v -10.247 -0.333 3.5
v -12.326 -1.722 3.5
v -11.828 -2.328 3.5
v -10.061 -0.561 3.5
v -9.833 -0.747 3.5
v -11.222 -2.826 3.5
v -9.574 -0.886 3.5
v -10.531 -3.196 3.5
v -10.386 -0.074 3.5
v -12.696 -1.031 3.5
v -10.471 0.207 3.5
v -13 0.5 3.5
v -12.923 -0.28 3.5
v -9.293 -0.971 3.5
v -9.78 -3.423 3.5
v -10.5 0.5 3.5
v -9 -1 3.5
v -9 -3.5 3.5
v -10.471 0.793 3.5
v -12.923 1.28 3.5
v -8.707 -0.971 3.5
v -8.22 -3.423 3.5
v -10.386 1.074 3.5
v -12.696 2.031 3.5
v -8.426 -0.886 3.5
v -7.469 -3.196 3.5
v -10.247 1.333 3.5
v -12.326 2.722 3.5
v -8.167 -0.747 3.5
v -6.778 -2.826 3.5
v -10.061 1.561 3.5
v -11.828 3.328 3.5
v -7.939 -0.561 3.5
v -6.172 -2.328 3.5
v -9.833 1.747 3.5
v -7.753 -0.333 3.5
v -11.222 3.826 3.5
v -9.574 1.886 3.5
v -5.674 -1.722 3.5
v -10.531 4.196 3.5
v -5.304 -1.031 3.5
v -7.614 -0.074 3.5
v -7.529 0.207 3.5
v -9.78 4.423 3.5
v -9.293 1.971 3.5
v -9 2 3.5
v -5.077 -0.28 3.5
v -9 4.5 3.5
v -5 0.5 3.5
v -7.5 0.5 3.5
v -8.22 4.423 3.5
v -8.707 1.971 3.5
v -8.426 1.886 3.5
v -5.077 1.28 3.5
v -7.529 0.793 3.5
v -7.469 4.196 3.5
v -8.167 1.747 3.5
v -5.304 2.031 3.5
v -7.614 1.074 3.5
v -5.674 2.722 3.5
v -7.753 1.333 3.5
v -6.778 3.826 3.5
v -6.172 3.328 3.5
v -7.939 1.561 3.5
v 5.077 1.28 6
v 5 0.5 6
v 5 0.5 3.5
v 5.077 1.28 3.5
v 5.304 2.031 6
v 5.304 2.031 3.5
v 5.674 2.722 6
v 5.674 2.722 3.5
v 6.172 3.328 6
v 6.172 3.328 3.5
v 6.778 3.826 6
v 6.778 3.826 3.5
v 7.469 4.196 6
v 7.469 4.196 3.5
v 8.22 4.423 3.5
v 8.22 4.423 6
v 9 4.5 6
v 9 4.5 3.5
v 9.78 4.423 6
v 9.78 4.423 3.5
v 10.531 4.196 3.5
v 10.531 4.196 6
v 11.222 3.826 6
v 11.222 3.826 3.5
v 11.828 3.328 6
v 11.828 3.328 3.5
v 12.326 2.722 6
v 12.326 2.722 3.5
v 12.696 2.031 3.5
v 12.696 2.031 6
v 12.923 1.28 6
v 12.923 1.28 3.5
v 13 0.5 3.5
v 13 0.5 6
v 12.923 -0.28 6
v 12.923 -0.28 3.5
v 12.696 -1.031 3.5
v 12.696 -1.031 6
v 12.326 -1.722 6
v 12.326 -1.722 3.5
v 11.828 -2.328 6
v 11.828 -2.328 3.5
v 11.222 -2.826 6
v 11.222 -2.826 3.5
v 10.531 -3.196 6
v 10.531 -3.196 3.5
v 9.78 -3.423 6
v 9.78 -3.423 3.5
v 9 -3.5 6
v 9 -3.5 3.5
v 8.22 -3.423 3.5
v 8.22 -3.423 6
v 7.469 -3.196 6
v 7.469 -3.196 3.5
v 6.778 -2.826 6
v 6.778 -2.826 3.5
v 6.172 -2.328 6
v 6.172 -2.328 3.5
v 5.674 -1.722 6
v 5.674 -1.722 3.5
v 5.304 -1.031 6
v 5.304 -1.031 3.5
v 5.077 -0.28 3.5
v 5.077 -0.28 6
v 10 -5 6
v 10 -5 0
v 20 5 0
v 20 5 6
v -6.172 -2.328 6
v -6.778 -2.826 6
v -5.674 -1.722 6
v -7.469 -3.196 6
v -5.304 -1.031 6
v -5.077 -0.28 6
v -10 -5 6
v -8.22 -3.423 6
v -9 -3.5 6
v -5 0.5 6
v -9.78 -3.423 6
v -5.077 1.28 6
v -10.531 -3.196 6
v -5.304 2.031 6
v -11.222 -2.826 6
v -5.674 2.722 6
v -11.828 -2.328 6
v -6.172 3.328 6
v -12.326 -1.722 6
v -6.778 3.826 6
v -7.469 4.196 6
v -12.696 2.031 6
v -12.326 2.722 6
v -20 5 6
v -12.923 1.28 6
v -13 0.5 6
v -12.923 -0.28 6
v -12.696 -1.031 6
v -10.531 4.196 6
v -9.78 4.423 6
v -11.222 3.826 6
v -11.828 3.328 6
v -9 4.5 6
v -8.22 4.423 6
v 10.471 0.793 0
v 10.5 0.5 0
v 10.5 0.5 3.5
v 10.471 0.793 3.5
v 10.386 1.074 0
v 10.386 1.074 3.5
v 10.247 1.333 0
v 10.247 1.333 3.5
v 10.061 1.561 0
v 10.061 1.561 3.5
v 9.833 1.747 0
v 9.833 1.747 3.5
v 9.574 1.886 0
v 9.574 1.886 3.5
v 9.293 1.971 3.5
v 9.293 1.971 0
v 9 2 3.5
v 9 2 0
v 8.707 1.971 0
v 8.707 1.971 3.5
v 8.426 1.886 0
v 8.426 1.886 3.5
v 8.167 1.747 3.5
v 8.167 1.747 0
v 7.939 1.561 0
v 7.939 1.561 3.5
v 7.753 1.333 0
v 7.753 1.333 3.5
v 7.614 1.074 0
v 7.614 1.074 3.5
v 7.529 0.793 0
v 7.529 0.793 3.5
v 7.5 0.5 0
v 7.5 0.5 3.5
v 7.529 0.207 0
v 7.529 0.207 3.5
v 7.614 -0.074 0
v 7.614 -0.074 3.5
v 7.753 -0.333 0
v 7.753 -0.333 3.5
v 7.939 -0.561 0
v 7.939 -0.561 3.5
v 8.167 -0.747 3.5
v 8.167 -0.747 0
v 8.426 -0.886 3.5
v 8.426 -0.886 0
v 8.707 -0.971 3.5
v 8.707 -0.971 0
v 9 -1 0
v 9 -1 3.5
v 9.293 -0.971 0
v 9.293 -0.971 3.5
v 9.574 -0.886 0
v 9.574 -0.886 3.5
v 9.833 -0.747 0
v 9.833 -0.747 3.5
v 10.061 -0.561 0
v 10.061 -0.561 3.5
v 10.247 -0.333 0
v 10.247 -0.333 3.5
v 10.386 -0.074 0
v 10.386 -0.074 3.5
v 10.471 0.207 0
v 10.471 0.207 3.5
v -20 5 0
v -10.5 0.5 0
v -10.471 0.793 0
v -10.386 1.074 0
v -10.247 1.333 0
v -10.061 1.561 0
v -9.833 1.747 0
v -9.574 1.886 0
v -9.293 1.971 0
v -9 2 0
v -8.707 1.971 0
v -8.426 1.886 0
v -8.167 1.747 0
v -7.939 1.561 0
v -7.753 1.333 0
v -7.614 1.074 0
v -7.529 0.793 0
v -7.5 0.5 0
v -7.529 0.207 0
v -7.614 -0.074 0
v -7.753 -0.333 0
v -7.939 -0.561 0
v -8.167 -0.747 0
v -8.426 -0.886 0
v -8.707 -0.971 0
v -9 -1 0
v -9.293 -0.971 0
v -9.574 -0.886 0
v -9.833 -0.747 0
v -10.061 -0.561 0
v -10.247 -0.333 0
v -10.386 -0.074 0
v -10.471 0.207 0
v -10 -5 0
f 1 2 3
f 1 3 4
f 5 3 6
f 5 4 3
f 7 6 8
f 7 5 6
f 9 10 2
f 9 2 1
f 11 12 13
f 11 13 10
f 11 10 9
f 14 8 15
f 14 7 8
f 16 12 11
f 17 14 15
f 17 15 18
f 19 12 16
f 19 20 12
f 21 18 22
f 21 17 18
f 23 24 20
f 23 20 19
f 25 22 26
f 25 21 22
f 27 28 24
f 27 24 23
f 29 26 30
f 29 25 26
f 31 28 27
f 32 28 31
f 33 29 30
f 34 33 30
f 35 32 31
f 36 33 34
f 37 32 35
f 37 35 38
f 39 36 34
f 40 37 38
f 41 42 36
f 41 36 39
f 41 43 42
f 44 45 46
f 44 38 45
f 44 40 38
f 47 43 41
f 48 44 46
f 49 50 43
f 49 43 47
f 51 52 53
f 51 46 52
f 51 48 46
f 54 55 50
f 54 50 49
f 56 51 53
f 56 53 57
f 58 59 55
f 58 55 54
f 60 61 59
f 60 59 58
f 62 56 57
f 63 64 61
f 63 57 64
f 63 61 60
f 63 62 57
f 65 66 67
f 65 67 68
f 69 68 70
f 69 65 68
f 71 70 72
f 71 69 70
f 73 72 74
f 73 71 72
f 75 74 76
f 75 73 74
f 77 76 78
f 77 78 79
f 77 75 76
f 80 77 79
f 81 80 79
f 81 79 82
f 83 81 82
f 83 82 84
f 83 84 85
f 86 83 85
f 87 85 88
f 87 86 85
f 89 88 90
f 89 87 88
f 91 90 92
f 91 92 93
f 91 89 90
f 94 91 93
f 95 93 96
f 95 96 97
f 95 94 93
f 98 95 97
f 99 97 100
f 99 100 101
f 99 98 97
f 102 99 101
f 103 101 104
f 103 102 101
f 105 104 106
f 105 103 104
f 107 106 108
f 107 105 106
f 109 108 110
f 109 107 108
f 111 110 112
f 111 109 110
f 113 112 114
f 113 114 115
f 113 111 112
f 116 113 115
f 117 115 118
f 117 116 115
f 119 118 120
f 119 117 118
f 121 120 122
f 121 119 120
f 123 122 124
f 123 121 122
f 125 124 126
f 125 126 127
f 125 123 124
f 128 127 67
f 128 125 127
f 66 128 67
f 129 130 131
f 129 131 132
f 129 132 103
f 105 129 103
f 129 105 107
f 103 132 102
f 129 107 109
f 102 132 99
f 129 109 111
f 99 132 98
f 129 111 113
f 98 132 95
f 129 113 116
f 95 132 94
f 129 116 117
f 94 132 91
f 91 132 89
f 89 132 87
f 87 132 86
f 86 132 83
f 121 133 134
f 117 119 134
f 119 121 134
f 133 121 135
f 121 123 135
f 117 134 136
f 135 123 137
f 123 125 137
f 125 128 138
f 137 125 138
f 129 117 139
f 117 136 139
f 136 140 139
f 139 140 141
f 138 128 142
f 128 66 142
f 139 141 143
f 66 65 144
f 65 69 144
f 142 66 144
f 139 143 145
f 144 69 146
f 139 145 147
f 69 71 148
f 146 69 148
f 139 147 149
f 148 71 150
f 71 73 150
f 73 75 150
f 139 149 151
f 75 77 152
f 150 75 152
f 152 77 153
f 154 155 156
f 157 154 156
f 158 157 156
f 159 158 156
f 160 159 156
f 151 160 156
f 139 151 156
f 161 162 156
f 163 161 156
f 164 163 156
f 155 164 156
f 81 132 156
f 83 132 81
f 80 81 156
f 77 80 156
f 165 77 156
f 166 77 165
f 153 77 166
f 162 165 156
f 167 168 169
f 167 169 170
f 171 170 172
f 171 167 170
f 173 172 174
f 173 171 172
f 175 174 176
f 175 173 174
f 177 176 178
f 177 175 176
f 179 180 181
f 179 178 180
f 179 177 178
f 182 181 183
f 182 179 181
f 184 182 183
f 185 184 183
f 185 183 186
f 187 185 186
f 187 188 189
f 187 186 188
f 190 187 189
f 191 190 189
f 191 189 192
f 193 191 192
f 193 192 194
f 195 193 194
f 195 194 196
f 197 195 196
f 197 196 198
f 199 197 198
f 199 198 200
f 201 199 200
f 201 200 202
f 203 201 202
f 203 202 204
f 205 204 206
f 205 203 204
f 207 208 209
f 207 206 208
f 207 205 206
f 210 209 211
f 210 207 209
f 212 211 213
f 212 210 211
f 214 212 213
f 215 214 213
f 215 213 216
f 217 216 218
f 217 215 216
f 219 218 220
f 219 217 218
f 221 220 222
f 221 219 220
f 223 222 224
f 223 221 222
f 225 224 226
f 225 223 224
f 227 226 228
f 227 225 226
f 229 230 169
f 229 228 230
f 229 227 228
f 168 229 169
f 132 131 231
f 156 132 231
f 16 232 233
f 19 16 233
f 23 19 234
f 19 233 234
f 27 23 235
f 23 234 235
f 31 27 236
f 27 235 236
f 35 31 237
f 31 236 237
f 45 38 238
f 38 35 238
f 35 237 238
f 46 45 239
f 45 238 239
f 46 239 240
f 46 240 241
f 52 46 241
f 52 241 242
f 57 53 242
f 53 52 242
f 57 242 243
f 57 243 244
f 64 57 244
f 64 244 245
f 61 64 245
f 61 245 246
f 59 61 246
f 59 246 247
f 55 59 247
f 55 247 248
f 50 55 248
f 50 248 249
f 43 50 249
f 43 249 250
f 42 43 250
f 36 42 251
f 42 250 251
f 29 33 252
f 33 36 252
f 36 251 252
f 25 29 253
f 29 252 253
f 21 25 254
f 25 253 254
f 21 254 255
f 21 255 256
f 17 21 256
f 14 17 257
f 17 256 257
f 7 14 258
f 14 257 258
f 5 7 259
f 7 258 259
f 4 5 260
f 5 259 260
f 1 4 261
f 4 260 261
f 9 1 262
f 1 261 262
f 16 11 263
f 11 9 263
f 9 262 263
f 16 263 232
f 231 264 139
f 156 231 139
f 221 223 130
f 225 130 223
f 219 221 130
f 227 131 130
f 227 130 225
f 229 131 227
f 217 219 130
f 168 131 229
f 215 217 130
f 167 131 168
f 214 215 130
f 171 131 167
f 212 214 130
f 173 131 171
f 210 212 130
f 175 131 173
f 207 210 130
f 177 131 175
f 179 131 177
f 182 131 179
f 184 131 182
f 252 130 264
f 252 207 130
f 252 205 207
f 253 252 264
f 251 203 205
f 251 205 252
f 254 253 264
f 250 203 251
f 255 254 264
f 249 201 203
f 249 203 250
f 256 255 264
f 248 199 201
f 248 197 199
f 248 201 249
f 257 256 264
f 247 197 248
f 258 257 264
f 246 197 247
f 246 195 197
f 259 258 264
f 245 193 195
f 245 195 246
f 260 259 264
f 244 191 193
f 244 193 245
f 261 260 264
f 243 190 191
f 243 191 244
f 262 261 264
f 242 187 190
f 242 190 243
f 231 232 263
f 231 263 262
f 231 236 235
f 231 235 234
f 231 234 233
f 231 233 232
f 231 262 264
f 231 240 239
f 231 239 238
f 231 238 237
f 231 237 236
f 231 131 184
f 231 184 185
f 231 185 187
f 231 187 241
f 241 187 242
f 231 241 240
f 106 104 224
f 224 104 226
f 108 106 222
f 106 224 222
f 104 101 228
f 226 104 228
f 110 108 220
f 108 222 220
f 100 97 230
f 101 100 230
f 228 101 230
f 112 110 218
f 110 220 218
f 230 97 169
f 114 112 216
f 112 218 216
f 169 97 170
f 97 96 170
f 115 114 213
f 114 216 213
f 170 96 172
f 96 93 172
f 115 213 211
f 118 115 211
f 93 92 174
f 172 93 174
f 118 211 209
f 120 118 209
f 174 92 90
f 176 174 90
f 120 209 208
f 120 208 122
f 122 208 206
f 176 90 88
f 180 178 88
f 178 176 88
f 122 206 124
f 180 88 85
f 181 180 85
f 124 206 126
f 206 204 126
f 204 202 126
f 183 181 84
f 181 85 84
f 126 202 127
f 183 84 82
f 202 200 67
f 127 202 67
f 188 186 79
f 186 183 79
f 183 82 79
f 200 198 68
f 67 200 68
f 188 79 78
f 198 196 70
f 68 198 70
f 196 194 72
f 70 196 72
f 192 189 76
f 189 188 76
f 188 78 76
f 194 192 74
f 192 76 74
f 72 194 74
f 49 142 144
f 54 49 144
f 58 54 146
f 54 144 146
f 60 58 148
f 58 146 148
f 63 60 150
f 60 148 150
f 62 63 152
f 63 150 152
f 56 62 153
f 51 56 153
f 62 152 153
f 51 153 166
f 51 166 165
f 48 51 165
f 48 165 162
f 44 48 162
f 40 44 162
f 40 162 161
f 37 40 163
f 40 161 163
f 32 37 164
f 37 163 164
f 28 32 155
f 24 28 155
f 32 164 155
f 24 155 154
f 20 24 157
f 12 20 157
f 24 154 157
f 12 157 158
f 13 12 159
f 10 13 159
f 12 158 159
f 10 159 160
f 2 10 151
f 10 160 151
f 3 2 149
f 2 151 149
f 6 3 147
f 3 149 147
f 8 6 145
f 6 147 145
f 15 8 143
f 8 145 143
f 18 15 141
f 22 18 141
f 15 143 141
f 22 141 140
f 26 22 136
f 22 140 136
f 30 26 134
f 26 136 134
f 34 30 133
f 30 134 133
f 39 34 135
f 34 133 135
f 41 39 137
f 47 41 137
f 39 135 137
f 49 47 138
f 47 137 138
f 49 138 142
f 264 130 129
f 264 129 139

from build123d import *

# Parameters (mm, degrees)
F0_W           = 20
F0_H           = 10
F1_DEPTH       = 6
F2_SIZE        = 9.99999
F3_R           = 4
F4_DEPTH       = 2.5
F6_D           = 3
F6_DEPTH       = 10
F6_CBORE_D     = 3
F6_CBORE_DEPTH = 10
F6_TIP         = 0.9012909285


# Not quite as in the source:
# - a fillet or chamfer is up to 0.001 mm smaller than in the source, because OpenCascade refuses the exact size


with BuildPart() as f1:
    # F0 (on Top) → F1 (new body)
    with BuildSketch(Plane.XY):
        with Locations((-10, 0)):
            Rectangle(F0_W, F0_H)
    extrude(amount=F1_DEPTH)

    # F2 (size 10 in the source; OpenCascade refuses exactly that, so slightly less here)
    f2_edges = [f1.edges().sort_by_distance(p)[0] for p in [
        (-20, -5, 3),
    ]]
    chamfer(f2_edges, length=F2_SIZE)

    # F3 (on face) → F4 (cut)
    with BuildSketch(Plane.XY.offset(6)):
        with Locations((-9, 0.5)):
            Circle(F3_R)
    extrude(amount=-F4_DEPTH, mode=Mode.SUBTRACT)

    # F6
    with Locations(Plane.XY.offset(3.5)):
        with Locations((-9, 0.5)):
            CounterBoreHole(F6_D / 2, F6_CBORE_D / 2, F6_CBORE_DEPTH, depth=F6_DEPTH)
            with Locations((0, 0, -(F6_DEPTH + F6_TIP / 2))):  # 118° drill point
                Cone(0, F6_D / 2, F6_TIP, mode=Mode.SUBTRACT)

    # F7: F1 across plane


with BuildPart() as f1_1:
    add(f1.part)
    add(f1.part.mirror(Plane.YZ))


solid = f1_1.part
